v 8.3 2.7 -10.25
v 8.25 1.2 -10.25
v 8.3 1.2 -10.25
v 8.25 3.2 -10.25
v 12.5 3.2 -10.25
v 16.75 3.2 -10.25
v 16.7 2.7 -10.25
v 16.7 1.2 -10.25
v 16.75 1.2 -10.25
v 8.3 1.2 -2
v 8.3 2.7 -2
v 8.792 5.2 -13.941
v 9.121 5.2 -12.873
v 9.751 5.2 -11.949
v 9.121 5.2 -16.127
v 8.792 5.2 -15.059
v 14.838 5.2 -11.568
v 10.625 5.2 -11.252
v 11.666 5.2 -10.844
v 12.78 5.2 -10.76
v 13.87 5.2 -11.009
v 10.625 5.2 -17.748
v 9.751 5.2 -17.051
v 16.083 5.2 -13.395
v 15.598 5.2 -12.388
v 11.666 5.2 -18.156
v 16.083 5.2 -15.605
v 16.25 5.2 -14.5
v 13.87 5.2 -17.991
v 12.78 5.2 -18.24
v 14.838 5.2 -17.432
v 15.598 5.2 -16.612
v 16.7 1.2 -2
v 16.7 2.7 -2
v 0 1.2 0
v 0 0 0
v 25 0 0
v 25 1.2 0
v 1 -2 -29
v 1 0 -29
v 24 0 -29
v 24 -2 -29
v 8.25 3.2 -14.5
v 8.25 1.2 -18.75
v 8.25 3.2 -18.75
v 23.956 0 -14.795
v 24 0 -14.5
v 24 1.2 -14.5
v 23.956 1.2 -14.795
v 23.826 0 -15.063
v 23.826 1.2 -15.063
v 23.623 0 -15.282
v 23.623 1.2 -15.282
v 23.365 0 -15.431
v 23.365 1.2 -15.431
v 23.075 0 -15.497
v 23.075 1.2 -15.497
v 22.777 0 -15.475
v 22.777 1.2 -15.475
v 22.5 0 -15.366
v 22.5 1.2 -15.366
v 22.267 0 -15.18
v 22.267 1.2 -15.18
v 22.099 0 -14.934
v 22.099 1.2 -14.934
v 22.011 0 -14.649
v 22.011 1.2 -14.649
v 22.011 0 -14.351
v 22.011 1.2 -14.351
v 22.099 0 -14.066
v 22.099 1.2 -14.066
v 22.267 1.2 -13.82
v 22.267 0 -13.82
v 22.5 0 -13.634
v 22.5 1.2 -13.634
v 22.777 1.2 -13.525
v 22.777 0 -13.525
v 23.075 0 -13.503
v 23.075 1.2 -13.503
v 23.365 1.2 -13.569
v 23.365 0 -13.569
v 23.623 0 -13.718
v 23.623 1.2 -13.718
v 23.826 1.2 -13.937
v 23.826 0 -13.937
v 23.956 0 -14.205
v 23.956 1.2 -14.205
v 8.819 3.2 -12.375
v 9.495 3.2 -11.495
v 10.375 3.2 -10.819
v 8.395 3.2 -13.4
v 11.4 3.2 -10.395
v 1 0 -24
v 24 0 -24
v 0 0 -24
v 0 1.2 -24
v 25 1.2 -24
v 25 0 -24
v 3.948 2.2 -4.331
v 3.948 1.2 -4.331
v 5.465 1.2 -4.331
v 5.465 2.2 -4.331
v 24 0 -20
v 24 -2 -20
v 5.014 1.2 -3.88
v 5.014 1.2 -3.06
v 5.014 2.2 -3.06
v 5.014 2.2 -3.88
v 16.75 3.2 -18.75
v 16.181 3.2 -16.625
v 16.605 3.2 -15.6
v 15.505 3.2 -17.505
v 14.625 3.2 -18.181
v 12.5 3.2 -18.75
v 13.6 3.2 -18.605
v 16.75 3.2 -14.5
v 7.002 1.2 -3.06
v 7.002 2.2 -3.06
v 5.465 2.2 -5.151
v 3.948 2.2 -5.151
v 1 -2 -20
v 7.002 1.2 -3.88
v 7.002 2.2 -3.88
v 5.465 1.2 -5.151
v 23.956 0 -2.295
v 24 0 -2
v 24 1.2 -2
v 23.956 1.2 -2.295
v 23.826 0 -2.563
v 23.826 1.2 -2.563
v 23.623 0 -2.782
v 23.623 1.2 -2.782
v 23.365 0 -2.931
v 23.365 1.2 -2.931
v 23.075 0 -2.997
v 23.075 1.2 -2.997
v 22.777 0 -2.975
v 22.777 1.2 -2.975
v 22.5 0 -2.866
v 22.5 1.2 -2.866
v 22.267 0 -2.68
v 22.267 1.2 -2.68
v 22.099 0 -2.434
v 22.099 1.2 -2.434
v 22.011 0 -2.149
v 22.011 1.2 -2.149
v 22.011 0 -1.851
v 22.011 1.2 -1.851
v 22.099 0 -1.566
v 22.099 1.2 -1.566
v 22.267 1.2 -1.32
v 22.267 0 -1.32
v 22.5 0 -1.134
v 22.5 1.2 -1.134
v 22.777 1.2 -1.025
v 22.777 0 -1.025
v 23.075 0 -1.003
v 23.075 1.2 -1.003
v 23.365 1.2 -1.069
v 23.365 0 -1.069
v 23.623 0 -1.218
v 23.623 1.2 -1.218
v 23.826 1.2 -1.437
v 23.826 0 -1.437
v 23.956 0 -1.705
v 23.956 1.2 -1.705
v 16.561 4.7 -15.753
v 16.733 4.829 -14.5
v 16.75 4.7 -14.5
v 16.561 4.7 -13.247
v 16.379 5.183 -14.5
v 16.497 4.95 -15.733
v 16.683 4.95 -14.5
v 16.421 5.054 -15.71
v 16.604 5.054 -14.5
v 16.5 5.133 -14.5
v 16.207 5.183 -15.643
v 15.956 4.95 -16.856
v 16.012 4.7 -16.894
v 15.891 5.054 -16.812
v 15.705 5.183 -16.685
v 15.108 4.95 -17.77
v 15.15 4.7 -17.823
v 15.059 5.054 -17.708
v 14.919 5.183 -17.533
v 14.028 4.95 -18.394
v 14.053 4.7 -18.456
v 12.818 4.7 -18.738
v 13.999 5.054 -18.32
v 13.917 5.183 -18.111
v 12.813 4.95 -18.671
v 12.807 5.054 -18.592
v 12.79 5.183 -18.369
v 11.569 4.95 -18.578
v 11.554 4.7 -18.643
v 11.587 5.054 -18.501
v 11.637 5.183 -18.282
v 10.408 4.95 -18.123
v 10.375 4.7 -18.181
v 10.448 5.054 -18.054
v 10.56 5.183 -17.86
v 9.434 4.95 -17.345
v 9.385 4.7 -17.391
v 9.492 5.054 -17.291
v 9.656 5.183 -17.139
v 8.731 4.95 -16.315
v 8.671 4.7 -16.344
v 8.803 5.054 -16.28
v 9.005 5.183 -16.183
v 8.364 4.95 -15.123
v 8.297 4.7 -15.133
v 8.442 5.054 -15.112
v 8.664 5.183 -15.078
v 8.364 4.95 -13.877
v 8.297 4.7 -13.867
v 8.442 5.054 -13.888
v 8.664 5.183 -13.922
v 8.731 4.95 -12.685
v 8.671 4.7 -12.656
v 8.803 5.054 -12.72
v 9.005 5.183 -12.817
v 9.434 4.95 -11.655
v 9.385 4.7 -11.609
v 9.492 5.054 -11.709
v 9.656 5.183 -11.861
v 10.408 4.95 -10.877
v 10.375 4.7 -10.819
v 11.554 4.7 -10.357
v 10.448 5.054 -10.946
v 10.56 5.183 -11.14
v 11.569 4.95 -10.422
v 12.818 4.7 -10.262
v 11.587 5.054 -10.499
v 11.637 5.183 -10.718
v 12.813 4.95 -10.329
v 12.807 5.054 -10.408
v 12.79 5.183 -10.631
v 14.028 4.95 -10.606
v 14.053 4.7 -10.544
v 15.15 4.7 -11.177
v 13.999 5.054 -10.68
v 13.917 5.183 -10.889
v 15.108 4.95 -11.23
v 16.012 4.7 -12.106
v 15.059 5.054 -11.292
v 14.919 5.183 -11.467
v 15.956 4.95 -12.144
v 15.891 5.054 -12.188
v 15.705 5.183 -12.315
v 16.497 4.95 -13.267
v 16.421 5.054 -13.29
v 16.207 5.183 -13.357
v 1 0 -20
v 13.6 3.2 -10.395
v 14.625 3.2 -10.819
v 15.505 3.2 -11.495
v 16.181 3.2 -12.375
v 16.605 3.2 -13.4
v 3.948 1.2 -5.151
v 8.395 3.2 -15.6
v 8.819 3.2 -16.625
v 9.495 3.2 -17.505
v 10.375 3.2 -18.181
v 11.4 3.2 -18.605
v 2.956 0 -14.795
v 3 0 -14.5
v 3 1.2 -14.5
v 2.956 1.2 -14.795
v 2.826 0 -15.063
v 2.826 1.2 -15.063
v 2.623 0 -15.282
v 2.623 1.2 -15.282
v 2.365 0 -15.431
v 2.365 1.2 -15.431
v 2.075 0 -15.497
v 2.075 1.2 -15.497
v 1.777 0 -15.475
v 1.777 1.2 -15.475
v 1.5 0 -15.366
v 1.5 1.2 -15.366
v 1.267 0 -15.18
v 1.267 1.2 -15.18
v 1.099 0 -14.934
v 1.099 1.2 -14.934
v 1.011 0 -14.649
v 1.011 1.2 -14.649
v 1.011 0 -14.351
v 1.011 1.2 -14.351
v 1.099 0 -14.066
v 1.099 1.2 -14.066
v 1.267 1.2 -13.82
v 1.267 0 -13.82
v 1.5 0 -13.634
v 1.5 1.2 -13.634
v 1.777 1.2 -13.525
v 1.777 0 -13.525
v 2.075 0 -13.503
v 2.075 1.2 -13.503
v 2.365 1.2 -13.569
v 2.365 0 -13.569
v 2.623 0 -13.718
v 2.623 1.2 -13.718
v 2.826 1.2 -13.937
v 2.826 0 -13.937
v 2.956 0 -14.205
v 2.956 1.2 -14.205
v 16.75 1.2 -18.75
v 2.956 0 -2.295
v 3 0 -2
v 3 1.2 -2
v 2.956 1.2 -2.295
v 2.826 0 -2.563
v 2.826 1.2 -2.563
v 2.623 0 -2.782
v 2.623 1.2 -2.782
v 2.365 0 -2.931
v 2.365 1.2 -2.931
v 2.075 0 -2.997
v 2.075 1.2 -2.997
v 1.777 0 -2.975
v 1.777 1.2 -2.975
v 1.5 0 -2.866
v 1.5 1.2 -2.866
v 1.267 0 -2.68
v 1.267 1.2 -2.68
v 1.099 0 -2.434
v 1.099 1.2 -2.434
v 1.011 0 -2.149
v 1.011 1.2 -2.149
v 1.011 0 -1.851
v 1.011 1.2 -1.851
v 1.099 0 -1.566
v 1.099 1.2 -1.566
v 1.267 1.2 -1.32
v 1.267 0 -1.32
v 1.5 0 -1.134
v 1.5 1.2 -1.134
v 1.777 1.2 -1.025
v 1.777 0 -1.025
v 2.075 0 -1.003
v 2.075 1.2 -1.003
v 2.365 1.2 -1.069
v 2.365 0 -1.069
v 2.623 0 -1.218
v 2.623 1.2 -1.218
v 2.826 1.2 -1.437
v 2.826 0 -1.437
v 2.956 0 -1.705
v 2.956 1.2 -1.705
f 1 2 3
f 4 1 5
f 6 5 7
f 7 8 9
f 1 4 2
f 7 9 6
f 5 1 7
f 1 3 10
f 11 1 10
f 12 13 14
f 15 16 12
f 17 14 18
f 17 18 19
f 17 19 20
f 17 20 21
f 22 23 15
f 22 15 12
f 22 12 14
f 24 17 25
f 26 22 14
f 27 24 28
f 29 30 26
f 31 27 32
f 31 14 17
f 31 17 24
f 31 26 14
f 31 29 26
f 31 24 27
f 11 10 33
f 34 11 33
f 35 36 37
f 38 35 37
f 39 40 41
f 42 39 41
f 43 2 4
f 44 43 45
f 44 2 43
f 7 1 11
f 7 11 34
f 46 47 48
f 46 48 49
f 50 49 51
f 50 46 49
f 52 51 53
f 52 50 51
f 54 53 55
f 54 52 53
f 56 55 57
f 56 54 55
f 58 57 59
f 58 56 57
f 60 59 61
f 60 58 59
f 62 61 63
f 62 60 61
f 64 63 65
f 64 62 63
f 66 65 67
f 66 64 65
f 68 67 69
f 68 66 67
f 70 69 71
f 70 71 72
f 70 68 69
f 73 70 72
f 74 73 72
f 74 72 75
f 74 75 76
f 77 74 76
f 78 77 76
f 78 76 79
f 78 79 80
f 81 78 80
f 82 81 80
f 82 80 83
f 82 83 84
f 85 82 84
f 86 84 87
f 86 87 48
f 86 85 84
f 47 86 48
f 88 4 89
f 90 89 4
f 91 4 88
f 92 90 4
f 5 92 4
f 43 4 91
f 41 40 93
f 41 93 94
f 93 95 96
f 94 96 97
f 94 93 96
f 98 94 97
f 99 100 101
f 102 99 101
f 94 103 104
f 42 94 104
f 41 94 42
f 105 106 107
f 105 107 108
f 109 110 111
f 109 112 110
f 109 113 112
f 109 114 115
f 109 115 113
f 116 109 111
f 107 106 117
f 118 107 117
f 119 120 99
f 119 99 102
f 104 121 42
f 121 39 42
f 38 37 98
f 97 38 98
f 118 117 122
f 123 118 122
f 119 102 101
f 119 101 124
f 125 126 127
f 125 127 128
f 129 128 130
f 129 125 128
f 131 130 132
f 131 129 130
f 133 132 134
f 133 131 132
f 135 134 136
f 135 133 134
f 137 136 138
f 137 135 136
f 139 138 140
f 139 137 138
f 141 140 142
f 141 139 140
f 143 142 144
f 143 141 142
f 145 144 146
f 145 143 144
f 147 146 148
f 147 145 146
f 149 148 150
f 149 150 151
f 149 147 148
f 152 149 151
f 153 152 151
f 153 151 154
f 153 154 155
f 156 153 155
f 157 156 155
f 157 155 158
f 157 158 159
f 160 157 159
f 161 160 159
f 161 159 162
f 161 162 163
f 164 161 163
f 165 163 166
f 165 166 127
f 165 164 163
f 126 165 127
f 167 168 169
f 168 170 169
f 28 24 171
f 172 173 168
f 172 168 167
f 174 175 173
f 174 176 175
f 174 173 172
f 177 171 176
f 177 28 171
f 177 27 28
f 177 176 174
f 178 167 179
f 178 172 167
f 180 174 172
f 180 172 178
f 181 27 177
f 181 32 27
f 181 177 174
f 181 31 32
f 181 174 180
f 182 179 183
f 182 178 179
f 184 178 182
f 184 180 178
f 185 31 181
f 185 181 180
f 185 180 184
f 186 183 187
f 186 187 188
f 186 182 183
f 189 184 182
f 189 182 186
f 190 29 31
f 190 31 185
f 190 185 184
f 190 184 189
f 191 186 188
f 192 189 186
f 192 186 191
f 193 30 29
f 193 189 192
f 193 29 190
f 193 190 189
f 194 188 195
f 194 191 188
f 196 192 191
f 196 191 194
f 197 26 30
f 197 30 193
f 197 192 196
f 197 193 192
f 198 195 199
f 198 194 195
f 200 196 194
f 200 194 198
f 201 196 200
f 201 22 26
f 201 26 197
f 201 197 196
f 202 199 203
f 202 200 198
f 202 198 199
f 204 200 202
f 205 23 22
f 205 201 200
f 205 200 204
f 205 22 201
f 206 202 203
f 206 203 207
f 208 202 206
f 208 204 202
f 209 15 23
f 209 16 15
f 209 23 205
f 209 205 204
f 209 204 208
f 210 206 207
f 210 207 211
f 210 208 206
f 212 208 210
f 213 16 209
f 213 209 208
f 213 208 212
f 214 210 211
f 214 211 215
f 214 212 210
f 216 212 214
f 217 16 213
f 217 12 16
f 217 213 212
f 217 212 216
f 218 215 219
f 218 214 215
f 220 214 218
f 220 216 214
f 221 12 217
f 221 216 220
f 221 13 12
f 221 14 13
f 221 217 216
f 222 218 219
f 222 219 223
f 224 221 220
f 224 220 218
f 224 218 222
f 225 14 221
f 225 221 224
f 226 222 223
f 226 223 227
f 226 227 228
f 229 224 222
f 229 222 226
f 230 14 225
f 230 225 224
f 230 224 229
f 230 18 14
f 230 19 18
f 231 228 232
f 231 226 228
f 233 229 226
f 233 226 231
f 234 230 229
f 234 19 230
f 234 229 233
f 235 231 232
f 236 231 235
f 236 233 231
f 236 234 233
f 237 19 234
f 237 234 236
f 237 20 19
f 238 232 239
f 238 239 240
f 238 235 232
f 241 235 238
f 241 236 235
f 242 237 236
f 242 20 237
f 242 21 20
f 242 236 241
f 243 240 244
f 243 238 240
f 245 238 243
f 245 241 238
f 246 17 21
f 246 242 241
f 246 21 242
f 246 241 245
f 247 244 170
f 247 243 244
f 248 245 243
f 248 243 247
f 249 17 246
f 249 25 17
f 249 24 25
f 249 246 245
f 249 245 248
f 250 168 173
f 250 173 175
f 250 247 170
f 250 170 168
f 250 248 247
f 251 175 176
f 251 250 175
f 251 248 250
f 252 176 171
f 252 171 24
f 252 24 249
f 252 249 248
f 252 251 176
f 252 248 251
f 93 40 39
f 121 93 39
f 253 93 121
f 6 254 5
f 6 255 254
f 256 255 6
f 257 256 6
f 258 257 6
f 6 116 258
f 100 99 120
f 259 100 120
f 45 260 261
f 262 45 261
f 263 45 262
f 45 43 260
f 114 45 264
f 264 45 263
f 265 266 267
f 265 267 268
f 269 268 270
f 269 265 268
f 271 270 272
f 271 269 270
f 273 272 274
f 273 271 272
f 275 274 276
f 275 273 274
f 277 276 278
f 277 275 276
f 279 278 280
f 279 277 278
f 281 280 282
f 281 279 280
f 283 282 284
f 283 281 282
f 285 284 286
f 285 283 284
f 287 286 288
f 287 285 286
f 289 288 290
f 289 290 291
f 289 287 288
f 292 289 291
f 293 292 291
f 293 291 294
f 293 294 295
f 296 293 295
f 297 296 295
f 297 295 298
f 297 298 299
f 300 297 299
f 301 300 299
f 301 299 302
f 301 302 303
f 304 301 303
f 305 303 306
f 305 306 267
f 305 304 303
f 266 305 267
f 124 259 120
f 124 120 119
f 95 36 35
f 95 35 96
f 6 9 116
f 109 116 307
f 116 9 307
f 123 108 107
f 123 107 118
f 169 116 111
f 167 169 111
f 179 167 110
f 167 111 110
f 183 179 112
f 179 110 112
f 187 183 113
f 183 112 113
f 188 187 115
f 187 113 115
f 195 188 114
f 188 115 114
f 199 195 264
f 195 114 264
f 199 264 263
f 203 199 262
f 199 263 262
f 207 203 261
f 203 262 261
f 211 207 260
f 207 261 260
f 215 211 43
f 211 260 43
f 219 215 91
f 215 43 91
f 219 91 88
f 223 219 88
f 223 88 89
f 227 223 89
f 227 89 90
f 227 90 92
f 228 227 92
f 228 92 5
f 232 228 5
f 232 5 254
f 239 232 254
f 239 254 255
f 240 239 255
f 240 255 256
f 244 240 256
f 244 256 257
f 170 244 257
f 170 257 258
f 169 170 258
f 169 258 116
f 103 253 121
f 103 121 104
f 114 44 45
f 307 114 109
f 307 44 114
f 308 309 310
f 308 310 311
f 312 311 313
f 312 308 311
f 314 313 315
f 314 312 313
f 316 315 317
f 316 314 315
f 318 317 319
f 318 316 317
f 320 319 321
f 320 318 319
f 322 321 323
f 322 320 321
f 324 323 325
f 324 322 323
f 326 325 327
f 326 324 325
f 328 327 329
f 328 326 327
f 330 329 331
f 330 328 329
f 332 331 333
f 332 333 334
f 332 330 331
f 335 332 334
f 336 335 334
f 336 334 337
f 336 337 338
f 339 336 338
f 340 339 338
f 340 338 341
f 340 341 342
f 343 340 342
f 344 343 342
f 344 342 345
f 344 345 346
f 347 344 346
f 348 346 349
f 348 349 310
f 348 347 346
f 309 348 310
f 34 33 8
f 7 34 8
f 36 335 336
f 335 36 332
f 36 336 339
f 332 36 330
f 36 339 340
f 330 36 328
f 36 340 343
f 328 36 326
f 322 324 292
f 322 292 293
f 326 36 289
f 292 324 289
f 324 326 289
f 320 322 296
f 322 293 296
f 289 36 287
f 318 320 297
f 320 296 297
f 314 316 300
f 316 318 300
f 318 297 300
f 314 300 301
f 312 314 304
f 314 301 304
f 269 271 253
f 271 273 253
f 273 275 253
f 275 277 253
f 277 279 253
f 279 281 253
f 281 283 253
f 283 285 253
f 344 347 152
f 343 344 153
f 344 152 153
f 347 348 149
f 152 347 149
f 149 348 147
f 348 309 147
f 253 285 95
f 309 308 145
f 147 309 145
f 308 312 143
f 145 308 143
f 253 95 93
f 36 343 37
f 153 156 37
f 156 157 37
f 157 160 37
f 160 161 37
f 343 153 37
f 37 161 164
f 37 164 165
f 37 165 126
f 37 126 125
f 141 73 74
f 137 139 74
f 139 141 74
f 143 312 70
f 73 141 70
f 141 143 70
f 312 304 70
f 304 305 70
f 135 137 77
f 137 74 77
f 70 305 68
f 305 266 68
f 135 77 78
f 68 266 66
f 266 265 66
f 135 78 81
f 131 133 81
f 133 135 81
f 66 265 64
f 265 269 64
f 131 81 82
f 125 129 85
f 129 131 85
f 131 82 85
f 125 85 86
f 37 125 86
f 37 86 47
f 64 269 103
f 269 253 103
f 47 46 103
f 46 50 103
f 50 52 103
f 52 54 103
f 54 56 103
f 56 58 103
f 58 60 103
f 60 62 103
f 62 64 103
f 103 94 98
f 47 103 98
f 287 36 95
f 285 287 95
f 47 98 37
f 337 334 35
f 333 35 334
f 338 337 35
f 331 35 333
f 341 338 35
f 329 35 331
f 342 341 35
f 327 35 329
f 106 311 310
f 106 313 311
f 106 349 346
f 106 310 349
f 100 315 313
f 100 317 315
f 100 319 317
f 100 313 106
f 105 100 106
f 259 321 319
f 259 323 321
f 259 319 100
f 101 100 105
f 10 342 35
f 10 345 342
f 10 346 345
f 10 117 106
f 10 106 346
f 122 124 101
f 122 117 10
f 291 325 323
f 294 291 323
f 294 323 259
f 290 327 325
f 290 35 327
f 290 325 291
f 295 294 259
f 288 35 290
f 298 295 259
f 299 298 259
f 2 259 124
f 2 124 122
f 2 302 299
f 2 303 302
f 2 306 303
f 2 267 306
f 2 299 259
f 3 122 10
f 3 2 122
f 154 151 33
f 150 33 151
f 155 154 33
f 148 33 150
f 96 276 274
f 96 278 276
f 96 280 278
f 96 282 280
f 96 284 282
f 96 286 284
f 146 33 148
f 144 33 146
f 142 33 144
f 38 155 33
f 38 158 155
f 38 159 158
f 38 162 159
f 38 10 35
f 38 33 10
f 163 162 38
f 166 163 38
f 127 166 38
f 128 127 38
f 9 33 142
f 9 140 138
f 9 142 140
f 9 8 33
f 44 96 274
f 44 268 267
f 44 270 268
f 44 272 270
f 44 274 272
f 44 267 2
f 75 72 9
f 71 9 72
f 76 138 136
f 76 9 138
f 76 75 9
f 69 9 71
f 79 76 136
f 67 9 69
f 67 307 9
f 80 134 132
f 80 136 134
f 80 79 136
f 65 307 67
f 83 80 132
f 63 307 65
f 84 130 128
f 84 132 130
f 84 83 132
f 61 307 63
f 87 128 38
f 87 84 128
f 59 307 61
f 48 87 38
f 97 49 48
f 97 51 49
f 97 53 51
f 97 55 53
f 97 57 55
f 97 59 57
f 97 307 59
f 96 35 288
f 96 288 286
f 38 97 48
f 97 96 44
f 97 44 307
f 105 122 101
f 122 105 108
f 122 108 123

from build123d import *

# Parameters (mm, degrees)
SKETCH1_W           = 25
SKETCH1_H           = 24
SKETCH1_R           = 1
BOSS_EXTRUDE1_DEPTH = 1.2
BOSS_EXTRUDE2_START = 1.2
BOSS_EXTRUDE2_DEPTH = 1.5
BOSS_EXTRUDE3_START = 1.2
SKETCH1_4_W         = 8.5
SKETCH1_4_H         = 8.5
BOSS_EXTRUDE3_DEPTH = 2
BOSS_EXTRUDE4_START = 1.2
SKETCH1_5_W         = 1.516820611
SKETCH1_5_H         = 0.819903033
SKETCH1_5_W_2       = 1.988264855
BOSS_EXTRUDE4_DEPTH = 1
SKETCH1_6_W         = 23
SKETCH1_6_H         = 4
SKETCH1_6_H_2       = 5
BOSS_EXTRUDE5_DEPTH = 2
BOSS_EXTRUDE6_START = 3.2
SKETCH1_7_R         = 4.25
BOSS_EXTRUDE6_DEPTH = 2
FILLET1_R           = 0.5


with BuildPart() as part:
    # Sketch1 → Boss-Extrude1 (new body)
    with BuildSketch(Plane(origin=(0, 0, 0), x_dir=(1, 0, 0), z_dir=(0, 1, 0))):
        with Locations((12.5, 12)):
            Rectangle(SKETCH1_W, SKETCH1_H)
        with Locations((2, 2)):
            Circle(SKETCH1_R, mode=Mode.SUBTRACT)
        with Locations((23, 2)):
            Circle(SKETCH1_R, mode=Mode.SUBTRACT)
        with Locations((2, 14.5)):
            Circle(SKETCH1_R, mode=Mode.SUBTRACT)
        with Locations((23, 14.5)):
            Circle(SKETCH1_R, mode=Mode.SUBTRACT)
    extrude(amount=BOSS_EXTRUDE1_DEPTH)

    # Sketch1<3> → Boss-Extrude2 (add)
    with BuildSketch(Plane(origin=(0, 0, 0), x_dir=(1, 0, 0), z_dir=(0, 1, 0)).offset(BOSS_EXTRUDE2_START)):
        Polygon((16.7, 10.25), (12.5, 10.25), (8.3, 10.25), (8.3, 2), (16.7, 2), align=None)
    extrude(amount=BOSS_EXTRUDE2_DEPTH)

    # Sketch1<4> → Boss-Extrude3 (add)
    with BuildSketch(Plane(origin=(0, 0, 0), x_dir=(1, 0, 0), z_dir=(0, 1, 0)).offset(BOSS_EXTRUDE3_START)):
        with Locations((12.5, 14.5)):
            Rectangle(SKETCH1_4_W, SKETCH1_4_H)
    extrude(amount=BOSS_EXTRUDE3_DEPTH)

    # Sketch1<5> → Boss-Extrude4 (add)
    with BuildSketch(Plane(origin=(0, 0, 0), x_dir=(1, 0, 0), z_dir=(0, 1, 0)).offset(BOSS_EXTRUDE4_START)):
        with Locations((4.706273263, 4.74063197)):
            Rectangle(SKETCH1_5_W, SKETCH1_5_H)
        with Locations((6.007869327, 3.469782269)):
            Rectangle(SKETCH1_5_W_2, SKETCH1_5_H)
    extrude(amount=BOSS_EXTRUDE4_DEPTH)

    # Sketch1<6> → Boss-Extrude5 (add)
    with BuildSketch(Plane(origin=(0, 0, 0), x_dir=(1, 0, 0), z_dir=(0, 1, 0))):
        with Locations((12.5, 22)):
            Rectangle(SKETCH1_6_W, SKETCH1_6_H)
        with Locations((12.5, 26.5)):
            Rectangle(SKETCH1_6_W, SKETCH1_6_H_2)
    extrude(amount=-BOSS_EXTRUDE5_DEPTH)

    # Sketch1<7> → Boss-Extrude6 (add)
    with BuildSketch(Plane(origin=(0, 0, 0), x_dir=(1, 0, 0), z_dir=(0, 1, 0)).offset(BOSS_EXTRUDE6_START)):
        with Locations((12.5, 14.5)):
            Circle(SKETCH1_7_R)
    extrude(amount=BOSS_EXTRUDE6_DEPTH)

    # Fillet1
    fillet1_edges = [part.edges().sort_by_distance(p)[0] for p in [
        (8.25, 5.2, -14.5),
    ]]
    fillet(fillet1_edges, radius=FILLET1_R)


solid = part.part
